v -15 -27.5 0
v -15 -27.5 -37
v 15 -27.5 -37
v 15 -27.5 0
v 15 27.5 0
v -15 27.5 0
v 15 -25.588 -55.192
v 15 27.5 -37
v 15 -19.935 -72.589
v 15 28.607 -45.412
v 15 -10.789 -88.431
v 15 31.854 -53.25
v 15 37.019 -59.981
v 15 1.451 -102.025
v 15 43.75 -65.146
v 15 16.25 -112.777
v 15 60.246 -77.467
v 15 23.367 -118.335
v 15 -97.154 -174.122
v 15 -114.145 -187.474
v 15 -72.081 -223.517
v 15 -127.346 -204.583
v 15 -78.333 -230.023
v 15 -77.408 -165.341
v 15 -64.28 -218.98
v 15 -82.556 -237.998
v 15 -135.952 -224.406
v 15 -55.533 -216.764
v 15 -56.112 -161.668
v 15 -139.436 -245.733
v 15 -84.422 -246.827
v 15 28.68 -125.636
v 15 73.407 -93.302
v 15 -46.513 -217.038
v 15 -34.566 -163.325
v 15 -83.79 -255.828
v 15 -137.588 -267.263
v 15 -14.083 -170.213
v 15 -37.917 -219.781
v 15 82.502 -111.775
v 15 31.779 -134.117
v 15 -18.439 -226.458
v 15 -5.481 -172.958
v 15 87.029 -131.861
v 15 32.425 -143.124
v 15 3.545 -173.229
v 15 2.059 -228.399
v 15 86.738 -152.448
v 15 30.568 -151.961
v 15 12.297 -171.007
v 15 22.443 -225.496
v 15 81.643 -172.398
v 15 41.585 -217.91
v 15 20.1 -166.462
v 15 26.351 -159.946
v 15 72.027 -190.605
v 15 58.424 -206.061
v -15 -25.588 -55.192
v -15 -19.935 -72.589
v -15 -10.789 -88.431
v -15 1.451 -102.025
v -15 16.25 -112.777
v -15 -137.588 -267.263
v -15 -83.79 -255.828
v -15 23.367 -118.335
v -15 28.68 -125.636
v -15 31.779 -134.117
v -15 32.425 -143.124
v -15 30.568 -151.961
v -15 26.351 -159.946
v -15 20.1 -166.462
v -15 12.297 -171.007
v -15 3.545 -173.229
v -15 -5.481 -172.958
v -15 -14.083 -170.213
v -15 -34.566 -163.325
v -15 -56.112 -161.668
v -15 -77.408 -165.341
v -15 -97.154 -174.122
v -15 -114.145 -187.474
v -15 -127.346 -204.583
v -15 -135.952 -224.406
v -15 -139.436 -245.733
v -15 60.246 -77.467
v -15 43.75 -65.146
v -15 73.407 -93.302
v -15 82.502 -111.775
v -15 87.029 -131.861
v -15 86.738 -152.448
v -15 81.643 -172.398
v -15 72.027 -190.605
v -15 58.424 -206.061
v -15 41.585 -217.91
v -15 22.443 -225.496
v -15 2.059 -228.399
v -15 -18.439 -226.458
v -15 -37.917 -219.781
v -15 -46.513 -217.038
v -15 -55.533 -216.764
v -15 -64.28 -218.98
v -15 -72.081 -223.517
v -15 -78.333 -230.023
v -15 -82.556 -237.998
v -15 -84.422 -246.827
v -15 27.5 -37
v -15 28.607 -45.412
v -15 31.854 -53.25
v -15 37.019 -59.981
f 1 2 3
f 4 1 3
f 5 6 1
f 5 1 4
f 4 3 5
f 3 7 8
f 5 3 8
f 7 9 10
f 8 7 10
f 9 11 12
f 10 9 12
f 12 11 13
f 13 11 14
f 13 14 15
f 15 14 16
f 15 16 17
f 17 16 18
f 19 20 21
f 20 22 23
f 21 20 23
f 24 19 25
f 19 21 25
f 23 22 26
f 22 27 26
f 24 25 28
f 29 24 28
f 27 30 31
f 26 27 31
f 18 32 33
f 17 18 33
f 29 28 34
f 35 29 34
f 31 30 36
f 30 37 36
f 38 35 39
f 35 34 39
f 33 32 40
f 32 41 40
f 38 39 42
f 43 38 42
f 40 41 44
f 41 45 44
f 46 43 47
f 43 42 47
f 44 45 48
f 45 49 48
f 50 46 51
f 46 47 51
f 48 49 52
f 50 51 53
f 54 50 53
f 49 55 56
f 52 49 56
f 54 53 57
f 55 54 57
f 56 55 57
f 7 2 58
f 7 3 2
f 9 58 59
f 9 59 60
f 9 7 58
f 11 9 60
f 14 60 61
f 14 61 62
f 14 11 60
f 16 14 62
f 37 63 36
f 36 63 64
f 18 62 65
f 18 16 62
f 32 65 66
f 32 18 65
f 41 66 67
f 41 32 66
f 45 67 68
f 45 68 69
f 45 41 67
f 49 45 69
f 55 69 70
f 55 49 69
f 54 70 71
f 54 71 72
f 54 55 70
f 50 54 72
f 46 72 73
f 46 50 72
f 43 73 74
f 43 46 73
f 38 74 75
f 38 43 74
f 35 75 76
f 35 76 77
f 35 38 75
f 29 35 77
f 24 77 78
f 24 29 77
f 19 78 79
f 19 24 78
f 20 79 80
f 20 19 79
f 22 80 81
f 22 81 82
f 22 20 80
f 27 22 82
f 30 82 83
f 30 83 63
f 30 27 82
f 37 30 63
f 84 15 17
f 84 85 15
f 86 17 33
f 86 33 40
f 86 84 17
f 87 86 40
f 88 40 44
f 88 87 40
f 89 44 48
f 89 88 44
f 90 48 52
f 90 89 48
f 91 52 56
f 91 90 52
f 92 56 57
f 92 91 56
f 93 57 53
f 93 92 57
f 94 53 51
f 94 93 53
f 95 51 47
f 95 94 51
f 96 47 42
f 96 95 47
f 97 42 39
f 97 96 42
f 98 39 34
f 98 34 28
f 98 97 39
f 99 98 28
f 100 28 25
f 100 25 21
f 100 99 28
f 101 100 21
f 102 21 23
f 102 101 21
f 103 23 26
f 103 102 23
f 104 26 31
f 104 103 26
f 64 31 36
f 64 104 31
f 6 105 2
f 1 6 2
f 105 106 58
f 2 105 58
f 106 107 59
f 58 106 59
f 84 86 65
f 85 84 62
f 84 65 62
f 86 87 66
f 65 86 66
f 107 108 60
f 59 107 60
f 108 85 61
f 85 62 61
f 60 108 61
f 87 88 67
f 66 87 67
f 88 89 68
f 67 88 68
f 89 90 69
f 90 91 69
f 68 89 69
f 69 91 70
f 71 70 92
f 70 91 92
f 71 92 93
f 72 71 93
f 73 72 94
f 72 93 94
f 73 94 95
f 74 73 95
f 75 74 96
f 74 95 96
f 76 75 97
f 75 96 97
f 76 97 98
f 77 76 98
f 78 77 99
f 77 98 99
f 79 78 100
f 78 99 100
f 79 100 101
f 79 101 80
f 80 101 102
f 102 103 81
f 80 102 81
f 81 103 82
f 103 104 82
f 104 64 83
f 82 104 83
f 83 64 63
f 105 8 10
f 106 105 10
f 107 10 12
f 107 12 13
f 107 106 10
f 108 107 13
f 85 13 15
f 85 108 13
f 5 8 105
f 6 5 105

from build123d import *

# Parameters (mm, degrees)
SKETCH_264_W = 30
SKETCH_264_H = 55


with BuildPart() as part:
    # По траектории2: sweep along a path in Sketch 339
    with BuildLine(Plane(origin=(0, 0, 0), x_dir=(0, 0, -1), z_dir=(1, 0, 0))) as sweep_2_path:
        Line((0, 0), (37, 0))
        ThreePointArc((37, 0), (67, 8.038475773), (88.961524227, 30))
        ThreePointArc((88.961524227, 30), (168.942963927, 53.05548357), (194.997071793, -26))
        ThreePointArc((194.997071793, -26), (201.894019343, -89.07186966), (261.54579658, -110.688856044))
    # Sketch 264 → По траектории2 (sweep)
    with BuildSketch(Plane.XY):
        Rectangle(SKETCH_264_W, SKETCH_264_H)
    sweep(path=sweep_2_path.line)


solid = part.part
